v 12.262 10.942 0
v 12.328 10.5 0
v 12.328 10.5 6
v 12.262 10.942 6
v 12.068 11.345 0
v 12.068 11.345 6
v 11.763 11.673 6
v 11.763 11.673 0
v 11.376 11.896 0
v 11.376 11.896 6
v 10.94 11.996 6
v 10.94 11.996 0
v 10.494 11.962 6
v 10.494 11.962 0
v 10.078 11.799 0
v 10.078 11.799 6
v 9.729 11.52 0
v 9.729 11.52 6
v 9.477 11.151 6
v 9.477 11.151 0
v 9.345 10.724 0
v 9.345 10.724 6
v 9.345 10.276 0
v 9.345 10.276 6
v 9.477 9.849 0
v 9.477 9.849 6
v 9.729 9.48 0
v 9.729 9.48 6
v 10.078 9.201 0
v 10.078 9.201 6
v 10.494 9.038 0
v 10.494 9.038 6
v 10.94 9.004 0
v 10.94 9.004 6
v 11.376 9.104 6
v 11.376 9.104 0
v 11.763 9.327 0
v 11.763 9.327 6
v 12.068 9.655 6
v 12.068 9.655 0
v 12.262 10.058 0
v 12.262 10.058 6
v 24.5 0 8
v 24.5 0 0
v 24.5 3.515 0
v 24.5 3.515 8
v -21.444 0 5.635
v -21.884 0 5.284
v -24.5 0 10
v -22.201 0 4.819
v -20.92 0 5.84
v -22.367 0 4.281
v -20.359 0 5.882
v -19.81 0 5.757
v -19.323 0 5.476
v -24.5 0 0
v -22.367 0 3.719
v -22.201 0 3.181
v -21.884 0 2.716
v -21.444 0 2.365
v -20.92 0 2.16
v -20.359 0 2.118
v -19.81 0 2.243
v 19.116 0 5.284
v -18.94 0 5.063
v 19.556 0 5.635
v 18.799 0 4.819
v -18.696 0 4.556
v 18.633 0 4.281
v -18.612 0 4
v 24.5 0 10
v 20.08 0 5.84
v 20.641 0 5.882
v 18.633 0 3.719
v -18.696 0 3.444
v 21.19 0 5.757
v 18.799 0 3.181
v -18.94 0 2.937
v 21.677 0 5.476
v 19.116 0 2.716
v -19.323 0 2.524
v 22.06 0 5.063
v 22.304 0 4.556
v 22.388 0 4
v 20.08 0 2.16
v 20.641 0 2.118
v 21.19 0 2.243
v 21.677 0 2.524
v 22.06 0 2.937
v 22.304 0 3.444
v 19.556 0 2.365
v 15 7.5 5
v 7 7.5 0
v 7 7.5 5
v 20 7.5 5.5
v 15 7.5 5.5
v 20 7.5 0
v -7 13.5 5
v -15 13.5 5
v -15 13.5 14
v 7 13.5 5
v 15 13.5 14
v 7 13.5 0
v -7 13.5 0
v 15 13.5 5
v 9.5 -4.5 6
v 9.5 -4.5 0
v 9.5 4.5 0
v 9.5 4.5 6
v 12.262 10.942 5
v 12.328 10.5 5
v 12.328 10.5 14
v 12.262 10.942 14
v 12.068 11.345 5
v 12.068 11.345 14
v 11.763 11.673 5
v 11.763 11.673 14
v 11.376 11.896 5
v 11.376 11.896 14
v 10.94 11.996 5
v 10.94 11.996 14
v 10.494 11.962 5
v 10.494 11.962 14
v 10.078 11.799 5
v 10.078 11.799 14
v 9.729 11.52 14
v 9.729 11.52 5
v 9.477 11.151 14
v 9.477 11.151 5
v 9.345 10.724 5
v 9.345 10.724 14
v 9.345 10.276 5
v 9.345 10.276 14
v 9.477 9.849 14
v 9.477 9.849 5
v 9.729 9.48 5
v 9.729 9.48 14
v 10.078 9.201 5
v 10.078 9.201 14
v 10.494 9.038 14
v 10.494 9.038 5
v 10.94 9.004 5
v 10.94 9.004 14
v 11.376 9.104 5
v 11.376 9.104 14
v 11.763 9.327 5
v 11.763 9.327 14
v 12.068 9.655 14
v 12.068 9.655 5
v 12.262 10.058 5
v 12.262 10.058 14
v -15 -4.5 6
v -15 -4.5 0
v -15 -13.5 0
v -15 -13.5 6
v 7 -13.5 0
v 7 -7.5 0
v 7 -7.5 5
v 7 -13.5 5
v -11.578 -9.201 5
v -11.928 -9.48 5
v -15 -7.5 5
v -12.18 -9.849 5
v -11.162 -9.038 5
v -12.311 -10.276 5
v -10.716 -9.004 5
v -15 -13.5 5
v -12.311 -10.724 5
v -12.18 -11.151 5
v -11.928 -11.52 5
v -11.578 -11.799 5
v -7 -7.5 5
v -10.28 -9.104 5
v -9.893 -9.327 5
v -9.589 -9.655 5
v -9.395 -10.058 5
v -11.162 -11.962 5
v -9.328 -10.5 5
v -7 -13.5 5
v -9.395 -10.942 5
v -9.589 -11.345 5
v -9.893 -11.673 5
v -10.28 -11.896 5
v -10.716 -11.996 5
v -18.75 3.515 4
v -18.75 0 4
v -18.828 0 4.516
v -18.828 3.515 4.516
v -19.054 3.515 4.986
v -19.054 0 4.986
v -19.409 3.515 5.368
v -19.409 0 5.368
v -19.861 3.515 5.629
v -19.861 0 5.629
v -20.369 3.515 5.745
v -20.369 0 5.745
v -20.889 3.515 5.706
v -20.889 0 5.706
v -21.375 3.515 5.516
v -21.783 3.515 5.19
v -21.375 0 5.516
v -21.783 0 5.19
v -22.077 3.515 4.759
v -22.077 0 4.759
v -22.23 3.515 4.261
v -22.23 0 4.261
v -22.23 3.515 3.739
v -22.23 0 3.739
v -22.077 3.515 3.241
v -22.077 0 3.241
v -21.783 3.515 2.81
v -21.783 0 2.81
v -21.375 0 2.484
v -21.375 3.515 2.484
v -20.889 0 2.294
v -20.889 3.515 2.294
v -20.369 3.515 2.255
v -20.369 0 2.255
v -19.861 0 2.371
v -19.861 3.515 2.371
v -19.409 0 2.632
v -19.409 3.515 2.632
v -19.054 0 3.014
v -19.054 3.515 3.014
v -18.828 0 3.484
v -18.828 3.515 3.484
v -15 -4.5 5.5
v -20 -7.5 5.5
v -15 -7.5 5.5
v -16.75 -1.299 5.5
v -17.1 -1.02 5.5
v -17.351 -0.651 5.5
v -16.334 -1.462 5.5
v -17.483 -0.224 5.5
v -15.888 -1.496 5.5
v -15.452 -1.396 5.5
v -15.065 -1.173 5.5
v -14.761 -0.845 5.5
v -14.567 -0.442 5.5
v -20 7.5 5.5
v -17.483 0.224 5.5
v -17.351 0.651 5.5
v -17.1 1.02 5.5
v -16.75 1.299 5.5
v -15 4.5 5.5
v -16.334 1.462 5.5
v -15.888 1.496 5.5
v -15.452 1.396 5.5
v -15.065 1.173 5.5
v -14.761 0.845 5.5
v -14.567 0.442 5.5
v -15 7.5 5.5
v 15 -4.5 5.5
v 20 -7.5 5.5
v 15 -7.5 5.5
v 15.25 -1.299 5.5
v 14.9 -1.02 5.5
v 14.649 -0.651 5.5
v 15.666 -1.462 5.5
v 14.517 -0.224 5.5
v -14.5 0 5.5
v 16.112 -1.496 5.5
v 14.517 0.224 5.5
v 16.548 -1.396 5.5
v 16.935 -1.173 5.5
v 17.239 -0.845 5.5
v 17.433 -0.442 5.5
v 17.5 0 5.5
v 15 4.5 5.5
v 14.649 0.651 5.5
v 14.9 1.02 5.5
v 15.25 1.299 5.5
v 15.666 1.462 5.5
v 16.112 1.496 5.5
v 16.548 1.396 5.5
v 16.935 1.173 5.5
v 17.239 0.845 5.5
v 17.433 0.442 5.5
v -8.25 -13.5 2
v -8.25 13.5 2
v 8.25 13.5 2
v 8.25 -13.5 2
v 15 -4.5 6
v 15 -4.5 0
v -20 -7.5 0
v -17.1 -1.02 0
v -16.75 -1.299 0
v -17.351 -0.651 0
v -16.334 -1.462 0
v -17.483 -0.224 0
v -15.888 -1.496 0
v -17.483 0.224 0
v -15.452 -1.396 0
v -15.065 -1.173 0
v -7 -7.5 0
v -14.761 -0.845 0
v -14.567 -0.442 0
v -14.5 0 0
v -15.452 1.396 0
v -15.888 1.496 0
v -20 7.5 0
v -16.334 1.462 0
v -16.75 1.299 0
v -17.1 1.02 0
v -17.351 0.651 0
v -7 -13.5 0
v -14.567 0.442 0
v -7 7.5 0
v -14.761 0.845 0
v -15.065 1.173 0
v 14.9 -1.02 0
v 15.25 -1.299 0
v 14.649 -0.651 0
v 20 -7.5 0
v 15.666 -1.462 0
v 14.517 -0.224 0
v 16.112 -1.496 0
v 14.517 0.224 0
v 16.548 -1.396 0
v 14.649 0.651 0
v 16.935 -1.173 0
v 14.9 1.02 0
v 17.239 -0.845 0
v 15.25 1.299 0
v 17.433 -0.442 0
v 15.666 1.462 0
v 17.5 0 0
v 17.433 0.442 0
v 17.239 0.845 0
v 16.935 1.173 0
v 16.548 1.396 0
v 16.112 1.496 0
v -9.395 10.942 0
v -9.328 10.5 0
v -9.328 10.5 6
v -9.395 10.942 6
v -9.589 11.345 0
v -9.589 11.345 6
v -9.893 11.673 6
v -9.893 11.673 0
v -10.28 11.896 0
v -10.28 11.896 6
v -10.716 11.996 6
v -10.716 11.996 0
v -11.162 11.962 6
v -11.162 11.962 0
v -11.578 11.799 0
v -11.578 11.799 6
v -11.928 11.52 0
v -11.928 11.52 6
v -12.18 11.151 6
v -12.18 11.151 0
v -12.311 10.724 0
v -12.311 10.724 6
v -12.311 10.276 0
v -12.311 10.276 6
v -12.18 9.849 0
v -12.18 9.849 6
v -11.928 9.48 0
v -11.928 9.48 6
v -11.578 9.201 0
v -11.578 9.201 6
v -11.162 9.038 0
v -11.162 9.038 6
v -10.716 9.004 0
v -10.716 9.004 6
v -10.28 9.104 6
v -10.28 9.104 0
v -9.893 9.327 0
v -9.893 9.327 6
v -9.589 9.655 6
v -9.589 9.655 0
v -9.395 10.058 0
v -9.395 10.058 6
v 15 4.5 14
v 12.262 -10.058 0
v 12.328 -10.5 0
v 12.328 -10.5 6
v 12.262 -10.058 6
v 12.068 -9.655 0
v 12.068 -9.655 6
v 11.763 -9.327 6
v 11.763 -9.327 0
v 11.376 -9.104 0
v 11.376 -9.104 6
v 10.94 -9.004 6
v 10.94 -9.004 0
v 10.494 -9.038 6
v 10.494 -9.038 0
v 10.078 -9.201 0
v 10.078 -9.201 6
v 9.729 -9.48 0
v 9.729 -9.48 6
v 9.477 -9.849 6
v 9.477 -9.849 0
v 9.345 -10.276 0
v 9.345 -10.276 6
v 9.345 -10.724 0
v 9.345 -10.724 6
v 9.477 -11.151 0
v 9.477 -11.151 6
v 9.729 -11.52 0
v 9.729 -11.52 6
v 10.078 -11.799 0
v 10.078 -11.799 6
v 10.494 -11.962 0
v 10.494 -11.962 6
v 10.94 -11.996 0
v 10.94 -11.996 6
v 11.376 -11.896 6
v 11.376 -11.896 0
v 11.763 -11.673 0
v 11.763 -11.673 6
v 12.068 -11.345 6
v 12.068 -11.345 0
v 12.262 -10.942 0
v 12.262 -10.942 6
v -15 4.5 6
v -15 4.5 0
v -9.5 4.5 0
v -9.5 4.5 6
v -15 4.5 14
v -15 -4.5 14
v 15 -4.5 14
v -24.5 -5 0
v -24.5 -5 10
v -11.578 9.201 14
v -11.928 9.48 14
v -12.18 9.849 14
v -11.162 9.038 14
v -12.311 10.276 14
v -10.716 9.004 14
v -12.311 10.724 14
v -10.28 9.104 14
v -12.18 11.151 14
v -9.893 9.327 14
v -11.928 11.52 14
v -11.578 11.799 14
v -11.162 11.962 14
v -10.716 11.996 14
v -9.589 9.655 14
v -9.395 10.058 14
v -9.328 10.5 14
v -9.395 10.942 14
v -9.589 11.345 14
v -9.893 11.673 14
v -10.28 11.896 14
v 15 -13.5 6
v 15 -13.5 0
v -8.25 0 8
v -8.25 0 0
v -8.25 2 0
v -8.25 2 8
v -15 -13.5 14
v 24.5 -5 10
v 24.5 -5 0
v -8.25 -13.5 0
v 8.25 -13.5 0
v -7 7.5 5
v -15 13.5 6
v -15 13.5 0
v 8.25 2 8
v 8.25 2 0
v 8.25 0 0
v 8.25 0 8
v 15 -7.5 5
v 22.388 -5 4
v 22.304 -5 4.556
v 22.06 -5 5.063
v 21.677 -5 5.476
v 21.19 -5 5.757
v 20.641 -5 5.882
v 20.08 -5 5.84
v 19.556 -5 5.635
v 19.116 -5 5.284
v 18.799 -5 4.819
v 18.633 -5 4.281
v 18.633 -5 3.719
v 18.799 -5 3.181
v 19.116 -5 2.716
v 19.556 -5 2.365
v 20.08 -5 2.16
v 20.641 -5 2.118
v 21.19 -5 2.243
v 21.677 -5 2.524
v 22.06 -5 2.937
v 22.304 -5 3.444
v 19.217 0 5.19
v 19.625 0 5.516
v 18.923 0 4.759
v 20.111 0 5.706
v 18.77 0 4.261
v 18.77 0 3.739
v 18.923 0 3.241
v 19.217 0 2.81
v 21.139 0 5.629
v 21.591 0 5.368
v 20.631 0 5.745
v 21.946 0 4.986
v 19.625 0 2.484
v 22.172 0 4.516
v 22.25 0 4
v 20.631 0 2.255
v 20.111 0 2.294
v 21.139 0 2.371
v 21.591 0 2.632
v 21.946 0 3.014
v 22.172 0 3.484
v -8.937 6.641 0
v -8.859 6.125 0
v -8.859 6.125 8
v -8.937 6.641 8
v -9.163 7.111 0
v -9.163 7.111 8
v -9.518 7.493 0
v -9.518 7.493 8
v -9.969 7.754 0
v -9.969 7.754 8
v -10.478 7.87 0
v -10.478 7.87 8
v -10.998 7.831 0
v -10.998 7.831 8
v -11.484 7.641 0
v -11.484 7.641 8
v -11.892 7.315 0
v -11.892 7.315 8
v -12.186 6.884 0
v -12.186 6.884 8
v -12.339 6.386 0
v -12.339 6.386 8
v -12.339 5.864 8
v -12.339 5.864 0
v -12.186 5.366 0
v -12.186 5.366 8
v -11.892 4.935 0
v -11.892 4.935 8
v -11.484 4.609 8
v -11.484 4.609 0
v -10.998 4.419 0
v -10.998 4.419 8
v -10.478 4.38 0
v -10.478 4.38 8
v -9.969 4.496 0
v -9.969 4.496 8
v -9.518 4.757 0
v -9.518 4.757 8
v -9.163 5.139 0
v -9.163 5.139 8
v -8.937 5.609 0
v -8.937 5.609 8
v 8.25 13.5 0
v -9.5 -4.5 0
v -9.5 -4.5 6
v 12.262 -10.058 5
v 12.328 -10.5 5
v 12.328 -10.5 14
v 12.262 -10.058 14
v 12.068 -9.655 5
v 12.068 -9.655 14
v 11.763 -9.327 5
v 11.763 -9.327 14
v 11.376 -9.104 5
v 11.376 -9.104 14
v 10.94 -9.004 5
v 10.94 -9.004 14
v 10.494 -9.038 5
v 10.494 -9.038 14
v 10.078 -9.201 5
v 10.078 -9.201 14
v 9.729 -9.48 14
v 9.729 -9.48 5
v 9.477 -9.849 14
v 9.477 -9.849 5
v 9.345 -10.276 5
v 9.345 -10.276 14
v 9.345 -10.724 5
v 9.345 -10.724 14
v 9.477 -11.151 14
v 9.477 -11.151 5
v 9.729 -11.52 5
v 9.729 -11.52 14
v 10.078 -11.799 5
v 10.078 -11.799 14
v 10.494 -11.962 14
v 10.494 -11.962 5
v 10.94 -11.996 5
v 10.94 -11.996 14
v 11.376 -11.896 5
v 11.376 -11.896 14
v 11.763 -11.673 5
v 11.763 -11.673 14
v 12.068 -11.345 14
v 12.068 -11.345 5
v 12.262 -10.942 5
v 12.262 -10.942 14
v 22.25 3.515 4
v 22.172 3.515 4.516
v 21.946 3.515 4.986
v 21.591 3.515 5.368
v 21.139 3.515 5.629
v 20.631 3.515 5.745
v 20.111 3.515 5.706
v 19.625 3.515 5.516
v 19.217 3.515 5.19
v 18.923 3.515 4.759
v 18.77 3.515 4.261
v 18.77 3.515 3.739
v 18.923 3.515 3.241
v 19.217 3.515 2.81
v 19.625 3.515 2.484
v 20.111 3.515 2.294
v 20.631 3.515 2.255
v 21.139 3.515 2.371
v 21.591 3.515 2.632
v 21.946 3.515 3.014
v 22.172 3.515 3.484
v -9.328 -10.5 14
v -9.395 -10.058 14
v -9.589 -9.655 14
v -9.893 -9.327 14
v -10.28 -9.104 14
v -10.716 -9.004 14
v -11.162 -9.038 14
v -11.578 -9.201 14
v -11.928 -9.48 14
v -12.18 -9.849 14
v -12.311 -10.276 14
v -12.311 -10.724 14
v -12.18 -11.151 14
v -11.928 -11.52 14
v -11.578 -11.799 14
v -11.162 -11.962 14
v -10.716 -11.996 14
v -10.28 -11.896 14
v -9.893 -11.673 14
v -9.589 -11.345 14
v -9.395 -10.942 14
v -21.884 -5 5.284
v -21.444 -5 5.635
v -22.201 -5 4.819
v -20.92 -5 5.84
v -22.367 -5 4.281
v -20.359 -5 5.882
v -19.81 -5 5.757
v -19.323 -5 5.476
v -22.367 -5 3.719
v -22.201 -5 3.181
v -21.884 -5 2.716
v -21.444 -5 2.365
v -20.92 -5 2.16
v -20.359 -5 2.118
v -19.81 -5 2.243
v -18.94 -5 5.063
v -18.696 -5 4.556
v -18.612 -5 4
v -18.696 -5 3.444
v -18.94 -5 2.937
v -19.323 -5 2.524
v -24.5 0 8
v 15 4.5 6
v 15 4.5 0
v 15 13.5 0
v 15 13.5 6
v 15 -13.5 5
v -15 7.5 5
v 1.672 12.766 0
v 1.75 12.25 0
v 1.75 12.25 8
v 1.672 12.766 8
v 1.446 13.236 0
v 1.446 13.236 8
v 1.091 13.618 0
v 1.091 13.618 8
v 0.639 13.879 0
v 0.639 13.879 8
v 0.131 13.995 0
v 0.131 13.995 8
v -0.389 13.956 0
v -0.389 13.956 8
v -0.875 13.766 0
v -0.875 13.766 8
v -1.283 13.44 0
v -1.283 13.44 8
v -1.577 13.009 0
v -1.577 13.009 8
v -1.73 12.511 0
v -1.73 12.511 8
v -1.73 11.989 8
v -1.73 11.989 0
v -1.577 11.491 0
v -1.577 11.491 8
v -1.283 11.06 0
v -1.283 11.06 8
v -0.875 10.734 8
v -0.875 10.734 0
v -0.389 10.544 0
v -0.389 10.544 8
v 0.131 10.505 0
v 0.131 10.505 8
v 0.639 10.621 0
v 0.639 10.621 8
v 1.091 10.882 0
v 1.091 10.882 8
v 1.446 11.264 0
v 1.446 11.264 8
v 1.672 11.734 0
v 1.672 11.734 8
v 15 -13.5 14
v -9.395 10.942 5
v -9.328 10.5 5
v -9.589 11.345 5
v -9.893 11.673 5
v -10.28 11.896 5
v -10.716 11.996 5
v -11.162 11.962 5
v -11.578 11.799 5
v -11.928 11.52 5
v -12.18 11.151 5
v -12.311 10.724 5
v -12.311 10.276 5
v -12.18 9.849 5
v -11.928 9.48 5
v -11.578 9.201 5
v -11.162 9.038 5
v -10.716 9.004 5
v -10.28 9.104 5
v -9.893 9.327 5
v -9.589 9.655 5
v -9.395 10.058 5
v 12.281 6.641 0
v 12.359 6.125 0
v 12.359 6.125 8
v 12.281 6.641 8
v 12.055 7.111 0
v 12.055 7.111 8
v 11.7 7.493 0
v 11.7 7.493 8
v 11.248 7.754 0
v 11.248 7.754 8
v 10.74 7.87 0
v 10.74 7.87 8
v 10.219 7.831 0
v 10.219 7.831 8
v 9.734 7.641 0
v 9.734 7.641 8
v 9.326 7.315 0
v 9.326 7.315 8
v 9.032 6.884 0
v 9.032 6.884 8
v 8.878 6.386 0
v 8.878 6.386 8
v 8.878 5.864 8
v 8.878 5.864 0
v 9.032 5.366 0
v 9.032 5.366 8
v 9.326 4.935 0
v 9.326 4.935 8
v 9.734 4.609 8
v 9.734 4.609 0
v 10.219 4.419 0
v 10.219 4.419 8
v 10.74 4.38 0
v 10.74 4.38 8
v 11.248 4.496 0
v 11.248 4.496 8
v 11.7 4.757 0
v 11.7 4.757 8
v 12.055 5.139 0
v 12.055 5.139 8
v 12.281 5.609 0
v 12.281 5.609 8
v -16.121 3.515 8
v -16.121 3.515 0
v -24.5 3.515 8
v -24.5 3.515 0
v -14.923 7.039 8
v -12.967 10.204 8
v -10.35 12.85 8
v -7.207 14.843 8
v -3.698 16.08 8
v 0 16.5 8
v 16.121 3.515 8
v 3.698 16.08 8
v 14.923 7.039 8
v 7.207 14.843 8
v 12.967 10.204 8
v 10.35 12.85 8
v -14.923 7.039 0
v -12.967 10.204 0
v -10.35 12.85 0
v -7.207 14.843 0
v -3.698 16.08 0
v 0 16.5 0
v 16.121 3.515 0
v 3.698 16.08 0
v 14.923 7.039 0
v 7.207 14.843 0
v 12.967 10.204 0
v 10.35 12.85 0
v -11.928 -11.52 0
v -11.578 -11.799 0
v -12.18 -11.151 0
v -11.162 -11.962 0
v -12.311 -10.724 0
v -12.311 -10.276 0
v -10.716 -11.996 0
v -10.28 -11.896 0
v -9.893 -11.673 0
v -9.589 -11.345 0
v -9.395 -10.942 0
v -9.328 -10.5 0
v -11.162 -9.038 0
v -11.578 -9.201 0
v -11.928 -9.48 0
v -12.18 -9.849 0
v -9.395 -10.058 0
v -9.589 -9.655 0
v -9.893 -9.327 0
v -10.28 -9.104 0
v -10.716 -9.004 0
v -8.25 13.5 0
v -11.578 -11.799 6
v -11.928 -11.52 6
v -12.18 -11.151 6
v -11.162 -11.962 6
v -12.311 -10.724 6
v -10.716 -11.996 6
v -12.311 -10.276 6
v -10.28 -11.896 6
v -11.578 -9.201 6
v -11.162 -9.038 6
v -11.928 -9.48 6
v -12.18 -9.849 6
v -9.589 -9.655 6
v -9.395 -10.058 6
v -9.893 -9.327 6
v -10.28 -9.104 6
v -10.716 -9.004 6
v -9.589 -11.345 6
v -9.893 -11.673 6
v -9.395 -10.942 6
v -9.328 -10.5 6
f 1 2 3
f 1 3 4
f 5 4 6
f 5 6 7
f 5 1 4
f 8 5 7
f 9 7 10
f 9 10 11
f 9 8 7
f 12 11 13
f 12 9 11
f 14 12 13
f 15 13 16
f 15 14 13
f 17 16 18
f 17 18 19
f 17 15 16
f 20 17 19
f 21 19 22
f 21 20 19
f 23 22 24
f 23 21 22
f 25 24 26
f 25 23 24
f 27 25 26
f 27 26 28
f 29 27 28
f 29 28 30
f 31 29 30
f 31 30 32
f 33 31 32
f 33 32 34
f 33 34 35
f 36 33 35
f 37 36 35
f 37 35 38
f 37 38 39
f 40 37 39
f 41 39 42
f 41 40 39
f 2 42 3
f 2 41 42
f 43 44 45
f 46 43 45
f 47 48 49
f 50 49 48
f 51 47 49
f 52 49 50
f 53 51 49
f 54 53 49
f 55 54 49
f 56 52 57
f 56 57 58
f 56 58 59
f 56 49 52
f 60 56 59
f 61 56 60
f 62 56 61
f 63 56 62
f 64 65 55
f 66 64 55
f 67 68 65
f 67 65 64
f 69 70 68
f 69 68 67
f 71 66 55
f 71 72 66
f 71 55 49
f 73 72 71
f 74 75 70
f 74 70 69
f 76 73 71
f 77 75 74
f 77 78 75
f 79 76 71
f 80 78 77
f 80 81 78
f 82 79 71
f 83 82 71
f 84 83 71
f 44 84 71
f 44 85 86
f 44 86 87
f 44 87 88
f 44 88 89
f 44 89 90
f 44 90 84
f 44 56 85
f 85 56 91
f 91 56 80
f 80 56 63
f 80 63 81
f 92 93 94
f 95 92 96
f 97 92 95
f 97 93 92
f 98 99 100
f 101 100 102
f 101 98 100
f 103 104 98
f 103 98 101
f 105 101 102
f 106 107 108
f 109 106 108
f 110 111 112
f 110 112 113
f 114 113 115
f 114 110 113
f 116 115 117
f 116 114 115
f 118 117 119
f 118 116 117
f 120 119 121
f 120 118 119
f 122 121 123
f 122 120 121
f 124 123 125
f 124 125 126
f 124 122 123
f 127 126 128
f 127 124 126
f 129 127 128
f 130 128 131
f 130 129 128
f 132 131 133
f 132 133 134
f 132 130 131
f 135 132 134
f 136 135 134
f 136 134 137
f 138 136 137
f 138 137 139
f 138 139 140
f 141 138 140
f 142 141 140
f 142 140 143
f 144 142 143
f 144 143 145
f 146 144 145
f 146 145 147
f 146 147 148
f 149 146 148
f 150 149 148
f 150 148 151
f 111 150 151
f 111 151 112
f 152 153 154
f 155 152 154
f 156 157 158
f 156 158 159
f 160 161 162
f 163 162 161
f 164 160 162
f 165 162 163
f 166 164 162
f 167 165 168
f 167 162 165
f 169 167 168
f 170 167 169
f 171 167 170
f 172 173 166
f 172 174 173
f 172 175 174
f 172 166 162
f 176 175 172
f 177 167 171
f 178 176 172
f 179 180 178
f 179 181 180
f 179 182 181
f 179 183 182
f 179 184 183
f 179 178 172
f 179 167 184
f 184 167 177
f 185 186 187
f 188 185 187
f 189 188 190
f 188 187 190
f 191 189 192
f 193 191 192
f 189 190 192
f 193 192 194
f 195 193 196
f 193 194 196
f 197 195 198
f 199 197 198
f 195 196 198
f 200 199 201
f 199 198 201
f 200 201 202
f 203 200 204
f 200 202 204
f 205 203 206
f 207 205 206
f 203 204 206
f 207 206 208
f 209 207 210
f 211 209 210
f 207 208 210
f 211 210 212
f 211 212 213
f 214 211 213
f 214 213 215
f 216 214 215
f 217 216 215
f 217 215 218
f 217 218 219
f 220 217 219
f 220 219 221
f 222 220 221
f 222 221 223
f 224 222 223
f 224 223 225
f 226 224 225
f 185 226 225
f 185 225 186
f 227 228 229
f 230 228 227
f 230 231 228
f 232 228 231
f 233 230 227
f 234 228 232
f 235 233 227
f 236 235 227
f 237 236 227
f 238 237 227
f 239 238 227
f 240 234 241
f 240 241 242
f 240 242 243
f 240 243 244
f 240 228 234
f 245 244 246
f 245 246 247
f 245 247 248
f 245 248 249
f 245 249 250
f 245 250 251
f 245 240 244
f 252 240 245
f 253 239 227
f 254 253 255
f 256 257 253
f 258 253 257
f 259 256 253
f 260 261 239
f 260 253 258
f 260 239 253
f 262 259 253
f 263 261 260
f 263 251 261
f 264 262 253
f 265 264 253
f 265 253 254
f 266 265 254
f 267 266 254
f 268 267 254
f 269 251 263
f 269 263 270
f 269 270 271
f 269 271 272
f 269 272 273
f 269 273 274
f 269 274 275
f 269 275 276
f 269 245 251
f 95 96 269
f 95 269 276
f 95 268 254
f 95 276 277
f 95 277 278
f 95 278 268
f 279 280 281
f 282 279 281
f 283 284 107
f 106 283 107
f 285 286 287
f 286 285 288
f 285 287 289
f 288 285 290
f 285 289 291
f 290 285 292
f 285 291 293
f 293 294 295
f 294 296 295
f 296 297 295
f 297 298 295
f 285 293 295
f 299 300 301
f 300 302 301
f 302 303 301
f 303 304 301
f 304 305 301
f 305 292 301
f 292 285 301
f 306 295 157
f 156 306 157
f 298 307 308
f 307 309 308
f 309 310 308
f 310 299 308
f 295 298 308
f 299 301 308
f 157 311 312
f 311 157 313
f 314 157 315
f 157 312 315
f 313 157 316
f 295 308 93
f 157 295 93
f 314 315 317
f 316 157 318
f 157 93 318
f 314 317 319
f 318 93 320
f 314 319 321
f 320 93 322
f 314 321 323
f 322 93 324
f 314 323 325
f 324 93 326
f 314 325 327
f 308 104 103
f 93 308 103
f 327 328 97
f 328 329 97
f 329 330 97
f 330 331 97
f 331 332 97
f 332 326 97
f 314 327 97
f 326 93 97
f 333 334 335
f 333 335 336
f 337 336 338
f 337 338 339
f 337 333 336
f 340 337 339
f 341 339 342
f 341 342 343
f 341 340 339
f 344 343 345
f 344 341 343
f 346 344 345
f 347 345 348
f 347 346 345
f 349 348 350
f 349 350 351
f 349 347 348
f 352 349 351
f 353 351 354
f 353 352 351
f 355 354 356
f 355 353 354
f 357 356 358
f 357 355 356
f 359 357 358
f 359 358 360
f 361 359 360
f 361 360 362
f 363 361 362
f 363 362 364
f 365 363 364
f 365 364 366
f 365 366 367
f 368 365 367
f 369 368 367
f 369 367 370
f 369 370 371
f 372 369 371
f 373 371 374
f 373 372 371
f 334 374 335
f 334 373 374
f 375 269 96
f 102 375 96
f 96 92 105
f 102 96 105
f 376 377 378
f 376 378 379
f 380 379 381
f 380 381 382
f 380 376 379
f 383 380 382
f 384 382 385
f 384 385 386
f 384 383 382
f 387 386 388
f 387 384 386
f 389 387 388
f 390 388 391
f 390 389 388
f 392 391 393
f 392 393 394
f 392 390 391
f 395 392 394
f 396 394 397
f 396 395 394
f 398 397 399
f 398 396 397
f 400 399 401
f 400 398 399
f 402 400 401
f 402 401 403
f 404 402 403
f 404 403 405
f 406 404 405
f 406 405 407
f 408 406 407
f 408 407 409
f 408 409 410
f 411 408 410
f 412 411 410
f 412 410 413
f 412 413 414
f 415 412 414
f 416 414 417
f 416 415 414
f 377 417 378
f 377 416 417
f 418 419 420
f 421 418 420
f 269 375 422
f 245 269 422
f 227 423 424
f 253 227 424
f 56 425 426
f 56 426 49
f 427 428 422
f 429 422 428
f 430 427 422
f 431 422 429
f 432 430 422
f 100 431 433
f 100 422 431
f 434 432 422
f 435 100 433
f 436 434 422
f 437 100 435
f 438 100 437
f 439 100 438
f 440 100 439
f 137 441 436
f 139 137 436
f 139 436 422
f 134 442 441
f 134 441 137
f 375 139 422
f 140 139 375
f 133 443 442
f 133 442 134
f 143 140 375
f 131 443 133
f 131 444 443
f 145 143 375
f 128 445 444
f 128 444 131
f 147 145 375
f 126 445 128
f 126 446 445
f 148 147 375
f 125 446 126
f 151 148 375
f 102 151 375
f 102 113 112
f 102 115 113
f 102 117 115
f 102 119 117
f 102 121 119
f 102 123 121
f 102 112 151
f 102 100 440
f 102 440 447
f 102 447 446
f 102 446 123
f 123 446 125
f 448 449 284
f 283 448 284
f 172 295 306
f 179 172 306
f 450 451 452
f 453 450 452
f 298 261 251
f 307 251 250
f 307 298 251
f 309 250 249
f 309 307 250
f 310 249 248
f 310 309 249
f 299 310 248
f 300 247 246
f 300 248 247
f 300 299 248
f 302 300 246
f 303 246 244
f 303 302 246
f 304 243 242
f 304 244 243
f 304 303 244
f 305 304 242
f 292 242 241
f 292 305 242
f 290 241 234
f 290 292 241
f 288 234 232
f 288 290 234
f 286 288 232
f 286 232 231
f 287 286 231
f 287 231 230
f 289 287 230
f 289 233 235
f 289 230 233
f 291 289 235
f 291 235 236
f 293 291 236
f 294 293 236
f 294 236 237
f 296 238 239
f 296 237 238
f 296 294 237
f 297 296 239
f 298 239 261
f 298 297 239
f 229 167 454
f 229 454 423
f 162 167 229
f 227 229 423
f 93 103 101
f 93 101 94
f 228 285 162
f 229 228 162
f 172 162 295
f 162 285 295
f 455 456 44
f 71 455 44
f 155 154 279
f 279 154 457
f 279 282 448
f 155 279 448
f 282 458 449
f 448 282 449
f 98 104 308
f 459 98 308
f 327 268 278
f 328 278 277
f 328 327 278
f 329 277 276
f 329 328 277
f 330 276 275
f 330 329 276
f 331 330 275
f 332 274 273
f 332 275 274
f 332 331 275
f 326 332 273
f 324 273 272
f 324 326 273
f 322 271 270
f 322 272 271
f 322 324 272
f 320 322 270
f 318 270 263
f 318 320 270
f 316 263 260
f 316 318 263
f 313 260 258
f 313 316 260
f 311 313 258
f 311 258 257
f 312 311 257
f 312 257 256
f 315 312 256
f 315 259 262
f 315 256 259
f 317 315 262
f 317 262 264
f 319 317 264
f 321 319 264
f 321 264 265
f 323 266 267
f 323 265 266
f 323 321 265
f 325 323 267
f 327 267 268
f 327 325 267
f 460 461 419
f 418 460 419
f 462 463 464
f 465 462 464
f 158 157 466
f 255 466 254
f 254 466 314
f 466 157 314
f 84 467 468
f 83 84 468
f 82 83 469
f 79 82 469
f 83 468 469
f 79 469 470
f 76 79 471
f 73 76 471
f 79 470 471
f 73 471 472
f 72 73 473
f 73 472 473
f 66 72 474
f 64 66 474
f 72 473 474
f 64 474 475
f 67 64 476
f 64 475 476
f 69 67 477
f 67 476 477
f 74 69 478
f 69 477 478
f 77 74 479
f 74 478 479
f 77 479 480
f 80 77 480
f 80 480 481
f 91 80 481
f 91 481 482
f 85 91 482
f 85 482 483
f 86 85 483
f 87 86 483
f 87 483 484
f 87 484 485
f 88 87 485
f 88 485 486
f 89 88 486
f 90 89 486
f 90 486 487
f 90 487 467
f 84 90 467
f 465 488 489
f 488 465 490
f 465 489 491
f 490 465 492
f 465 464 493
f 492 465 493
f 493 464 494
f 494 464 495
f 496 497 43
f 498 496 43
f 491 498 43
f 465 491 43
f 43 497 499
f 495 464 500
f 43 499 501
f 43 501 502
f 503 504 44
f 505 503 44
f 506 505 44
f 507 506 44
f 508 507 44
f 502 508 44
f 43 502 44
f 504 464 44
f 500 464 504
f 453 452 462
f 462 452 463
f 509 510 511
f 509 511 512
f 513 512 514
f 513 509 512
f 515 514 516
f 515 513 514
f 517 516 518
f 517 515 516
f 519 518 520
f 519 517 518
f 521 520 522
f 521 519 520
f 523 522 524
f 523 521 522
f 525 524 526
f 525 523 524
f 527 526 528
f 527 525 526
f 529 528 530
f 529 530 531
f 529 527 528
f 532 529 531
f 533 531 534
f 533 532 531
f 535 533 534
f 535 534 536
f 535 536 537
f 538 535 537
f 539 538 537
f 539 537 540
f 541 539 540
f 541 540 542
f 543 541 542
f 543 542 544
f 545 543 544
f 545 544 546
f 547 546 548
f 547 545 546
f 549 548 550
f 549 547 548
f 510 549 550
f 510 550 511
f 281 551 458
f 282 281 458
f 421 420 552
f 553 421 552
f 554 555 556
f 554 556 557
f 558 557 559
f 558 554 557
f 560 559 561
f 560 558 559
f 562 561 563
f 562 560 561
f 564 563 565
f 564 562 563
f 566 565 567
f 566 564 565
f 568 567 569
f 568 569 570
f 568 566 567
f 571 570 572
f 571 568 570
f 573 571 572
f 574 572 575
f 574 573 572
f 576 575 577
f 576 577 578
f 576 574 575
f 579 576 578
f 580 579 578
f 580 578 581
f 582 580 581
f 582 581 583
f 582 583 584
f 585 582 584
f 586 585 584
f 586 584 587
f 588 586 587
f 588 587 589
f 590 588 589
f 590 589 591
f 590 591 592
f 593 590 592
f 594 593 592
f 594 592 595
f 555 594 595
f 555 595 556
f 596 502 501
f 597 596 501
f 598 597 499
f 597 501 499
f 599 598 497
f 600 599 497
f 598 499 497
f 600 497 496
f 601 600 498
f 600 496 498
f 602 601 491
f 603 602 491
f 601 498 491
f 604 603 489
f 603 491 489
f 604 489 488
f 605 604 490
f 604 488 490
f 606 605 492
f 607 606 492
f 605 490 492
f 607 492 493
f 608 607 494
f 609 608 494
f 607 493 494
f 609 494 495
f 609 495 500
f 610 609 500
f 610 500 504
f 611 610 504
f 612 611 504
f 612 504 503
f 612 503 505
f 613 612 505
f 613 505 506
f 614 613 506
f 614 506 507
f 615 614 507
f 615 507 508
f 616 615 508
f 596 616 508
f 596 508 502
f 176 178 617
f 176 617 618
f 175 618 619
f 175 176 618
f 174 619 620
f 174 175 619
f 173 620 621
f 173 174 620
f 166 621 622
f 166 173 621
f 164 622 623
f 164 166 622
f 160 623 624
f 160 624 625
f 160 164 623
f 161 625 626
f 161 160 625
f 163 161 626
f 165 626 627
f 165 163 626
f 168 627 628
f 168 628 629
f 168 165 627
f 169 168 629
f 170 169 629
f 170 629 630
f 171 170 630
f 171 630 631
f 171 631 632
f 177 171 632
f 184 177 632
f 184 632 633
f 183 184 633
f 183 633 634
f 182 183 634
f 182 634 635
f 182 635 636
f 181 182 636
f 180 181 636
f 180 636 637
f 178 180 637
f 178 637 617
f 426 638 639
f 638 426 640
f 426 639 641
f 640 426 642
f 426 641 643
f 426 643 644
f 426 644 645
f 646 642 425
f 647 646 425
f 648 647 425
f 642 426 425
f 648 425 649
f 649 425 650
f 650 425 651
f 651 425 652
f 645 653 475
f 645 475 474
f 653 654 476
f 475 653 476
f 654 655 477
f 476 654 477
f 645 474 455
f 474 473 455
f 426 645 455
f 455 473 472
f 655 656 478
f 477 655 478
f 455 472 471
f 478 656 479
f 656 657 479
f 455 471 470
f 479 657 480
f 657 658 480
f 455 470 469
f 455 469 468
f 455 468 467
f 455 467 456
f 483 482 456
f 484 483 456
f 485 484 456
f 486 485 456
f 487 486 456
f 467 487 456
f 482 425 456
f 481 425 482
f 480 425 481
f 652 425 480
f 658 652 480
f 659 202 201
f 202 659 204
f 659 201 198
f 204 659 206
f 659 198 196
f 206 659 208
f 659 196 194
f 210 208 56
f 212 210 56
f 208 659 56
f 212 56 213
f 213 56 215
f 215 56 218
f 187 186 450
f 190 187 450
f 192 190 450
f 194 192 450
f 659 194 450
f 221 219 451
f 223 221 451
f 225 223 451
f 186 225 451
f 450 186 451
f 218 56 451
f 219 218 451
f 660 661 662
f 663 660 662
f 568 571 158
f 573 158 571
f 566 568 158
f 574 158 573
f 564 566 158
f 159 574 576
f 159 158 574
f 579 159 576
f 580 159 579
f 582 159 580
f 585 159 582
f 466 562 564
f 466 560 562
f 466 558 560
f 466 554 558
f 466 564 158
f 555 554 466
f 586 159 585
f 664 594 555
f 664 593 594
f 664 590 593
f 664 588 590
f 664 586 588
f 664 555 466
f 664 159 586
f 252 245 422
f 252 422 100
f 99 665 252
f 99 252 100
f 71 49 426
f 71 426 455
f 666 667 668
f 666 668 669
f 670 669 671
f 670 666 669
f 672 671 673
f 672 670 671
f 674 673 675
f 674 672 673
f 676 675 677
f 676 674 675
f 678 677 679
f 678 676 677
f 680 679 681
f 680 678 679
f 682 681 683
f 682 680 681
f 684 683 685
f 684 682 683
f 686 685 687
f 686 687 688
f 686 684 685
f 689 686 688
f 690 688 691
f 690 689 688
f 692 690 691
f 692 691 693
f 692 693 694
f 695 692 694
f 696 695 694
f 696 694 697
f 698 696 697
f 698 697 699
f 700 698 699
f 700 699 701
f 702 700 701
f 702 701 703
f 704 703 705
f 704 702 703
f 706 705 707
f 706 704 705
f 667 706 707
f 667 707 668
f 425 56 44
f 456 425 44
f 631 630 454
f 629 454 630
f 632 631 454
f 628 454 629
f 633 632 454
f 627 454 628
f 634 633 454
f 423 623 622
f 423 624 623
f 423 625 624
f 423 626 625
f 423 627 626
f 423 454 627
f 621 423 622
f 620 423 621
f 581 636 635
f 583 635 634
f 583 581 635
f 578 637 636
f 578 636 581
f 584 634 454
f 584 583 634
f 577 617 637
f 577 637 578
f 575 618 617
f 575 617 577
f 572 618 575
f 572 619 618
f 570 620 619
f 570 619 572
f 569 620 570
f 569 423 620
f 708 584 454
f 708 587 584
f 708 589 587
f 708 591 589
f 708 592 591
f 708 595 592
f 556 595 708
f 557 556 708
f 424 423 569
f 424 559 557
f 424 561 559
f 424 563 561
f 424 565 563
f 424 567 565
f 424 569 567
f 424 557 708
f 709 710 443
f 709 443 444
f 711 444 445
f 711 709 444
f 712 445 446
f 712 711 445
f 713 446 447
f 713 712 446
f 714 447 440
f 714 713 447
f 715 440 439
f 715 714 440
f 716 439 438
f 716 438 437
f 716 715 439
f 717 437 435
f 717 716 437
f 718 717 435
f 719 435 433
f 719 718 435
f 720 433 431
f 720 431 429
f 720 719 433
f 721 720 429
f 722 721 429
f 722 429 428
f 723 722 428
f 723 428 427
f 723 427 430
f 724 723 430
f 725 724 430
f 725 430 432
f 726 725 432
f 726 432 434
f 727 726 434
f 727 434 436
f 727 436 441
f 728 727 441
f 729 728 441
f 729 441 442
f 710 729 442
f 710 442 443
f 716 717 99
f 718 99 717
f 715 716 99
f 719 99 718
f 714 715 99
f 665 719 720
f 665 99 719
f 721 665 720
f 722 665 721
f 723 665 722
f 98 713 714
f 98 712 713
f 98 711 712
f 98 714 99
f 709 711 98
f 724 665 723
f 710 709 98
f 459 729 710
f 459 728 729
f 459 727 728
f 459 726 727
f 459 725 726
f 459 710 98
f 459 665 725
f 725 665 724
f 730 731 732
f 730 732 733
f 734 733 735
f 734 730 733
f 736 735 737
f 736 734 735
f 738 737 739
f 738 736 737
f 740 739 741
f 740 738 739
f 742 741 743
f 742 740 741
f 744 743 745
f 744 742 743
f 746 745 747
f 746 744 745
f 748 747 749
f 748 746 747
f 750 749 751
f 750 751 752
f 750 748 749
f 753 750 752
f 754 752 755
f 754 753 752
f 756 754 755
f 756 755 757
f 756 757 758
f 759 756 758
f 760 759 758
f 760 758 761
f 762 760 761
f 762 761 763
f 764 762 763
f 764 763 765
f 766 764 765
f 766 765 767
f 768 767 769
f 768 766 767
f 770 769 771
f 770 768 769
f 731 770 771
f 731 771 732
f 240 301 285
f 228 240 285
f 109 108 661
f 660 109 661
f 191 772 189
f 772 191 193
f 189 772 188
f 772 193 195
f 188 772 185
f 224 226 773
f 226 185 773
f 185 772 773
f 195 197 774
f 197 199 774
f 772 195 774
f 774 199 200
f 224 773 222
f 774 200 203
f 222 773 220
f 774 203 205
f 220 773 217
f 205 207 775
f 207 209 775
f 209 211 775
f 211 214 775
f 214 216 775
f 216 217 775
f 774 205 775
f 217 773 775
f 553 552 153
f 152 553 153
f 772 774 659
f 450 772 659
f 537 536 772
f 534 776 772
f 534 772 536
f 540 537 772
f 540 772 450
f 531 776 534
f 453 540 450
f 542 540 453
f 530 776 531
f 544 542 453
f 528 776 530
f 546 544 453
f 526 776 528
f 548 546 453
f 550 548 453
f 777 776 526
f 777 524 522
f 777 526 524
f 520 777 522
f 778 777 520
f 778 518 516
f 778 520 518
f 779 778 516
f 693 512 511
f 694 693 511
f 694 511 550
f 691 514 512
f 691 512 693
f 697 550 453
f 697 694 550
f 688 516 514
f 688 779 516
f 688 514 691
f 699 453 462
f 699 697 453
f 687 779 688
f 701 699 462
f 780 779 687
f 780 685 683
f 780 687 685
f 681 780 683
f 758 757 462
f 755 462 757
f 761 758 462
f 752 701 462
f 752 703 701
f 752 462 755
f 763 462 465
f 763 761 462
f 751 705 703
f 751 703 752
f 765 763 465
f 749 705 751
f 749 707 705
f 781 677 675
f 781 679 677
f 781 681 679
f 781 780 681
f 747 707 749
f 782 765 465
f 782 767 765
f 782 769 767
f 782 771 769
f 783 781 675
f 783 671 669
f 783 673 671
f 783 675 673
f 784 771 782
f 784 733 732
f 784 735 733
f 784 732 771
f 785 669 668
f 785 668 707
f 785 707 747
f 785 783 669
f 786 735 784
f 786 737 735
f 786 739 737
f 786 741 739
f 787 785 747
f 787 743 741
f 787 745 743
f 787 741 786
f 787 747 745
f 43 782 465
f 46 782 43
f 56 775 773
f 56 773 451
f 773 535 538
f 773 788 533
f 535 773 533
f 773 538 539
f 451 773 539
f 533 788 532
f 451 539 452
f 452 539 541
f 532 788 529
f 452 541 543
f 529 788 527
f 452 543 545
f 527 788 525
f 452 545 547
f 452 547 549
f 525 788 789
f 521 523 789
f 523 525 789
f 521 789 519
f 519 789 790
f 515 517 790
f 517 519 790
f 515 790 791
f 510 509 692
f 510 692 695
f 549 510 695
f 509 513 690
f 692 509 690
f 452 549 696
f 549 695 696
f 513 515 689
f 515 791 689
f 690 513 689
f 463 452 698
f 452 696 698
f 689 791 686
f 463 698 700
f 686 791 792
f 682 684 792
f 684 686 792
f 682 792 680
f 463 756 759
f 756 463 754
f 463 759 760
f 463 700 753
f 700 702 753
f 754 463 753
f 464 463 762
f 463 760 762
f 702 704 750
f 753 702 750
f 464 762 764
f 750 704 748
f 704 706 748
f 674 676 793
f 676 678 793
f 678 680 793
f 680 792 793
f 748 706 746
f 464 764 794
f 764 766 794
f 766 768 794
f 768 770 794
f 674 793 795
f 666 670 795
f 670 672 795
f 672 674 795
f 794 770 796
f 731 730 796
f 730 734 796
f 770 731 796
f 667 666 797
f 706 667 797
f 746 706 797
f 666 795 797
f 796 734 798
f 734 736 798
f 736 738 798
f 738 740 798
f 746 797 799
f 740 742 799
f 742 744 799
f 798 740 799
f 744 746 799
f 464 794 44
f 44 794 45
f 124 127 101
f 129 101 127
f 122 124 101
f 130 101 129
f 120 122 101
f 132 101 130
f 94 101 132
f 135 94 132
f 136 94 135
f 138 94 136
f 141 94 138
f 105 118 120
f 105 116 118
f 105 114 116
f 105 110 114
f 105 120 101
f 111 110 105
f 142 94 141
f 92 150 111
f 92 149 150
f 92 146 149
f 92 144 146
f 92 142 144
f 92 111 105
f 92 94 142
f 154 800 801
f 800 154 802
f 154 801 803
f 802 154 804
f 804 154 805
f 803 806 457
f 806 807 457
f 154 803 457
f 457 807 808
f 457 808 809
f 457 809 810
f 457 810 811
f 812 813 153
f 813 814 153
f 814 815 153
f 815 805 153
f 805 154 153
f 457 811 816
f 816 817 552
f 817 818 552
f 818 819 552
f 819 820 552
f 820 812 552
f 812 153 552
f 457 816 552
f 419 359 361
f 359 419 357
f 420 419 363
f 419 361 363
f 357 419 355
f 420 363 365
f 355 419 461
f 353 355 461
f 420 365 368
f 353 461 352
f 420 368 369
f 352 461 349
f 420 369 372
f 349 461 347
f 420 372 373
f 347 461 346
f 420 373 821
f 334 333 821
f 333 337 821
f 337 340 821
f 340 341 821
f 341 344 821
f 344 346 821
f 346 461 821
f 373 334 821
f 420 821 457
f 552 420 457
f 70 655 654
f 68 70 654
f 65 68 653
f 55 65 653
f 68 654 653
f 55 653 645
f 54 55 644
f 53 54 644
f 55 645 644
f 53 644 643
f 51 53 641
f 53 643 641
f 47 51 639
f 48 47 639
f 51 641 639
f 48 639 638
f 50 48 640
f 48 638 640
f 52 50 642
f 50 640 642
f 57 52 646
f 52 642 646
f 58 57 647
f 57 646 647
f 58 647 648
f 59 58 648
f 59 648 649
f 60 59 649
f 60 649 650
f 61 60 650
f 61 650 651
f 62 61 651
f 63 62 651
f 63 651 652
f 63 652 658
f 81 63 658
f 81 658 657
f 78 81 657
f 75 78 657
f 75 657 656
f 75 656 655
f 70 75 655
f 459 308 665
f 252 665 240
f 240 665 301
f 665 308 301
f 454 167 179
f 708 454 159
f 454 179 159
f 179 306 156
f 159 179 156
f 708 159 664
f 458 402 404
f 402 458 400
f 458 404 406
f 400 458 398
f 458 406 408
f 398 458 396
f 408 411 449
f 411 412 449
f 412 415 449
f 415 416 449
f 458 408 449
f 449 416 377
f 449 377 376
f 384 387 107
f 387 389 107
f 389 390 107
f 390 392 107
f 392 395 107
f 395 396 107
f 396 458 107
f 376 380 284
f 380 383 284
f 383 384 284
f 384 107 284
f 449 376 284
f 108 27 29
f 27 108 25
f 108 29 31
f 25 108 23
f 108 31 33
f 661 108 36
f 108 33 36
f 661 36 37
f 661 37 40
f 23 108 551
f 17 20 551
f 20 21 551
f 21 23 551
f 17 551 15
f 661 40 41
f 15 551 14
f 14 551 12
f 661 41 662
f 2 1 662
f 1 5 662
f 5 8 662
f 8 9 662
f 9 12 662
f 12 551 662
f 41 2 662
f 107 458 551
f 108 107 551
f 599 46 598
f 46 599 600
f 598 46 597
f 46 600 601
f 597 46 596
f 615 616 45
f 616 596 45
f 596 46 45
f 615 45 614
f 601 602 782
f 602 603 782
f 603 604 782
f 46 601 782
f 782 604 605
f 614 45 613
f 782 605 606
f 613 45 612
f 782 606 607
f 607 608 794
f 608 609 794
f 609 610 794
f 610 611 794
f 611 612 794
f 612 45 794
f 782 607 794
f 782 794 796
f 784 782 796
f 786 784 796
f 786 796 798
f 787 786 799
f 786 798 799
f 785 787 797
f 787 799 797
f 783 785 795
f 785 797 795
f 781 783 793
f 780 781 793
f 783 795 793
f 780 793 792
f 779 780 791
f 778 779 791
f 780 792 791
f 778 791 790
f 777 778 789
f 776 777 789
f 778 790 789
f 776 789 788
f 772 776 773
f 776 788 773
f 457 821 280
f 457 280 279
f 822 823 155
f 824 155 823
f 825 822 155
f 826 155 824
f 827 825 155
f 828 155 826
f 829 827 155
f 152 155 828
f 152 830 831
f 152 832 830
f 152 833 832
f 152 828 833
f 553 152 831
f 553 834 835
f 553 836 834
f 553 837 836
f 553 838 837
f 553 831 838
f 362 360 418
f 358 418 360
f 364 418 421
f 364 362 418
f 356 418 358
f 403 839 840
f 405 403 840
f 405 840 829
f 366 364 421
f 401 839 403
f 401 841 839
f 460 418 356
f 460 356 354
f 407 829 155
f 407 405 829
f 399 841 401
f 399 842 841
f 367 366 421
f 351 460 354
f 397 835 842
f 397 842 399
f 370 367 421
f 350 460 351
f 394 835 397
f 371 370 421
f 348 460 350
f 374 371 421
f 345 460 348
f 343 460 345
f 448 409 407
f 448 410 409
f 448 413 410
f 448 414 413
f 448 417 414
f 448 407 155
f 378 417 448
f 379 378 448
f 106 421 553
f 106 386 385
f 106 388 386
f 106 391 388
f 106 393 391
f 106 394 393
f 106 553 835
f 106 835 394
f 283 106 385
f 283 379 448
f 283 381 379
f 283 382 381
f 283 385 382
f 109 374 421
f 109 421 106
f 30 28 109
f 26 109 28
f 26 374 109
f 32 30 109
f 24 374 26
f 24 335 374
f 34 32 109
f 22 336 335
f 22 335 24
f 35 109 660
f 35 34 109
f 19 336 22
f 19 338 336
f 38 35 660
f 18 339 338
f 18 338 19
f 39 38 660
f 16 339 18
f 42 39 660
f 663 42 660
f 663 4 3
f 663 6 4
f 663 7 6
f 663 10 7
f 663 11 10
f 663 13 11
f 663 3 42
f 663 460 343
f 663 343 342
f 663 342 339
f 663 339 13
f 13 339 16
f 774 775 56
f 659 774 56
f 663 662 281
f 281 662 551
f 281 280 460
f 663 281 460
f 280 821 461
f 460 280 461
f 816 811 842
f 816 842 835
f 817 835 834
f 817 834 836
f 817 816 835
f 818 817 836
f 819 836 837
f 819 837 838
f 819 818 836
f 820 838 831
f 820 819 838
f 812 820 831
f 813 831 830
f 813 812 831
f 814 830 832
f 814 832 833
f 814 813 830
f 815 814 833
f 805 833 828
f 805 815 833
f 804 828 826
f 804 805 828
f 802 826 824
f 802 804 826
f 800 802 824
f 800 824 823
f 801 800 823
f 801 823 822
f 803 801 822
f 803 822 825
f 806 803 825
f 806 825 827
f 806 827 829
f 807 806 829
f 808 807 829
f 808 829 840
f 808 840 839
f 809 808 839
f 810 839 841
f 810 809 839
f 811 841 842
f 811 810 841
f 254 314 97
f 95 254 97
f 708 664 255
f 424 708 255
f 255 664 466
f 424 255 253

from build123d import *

# Parameters (mm, degrees)
F0_R      = 1.5
F0_W      = 30
F0_H      = 6
F1_DEPTH  = 14
F3_DEPTH  = 8.5
F4_R      = 1.5
F5_DEPTH  = 6
F6_W      = 16.5
F6_H      = 27
F7_DEPTH  = 2
F8_W      = 8
F8_H      = 6
F9_DEPTH  = 5
F10_R     = 1.75
F11_DEPTH = 8
F12_R     = 1.75
F13_DEPTH = 25
F14_W     = 49
F14_H     = 5
F15_DEPTH = 10
F16_R     = 1.8877590654
F17_DEPTH = 8


with BuildPart() as f1:
    # F0 (on Top) → F1 (new body)
    with BuildSketch(Plane.XY):
        Polygon((-15, 7.5), (-20, 7.5), (-20, -7.5), (-15, -7.5), (15, -7.5), (20, -7.5), (20, 7.5), (15, 7.5), align=None)
        with Locations((-16, 0)):
            Circle(F0_R, mode=Mode.SUBTRACT)
        with Locations((16, 0)):
            Circle(F0_R, mode=Mode.SUBTRACT)
        with Locations((0, 10.5)):
            Rectangle(F0_W, F0_H)
        with Locations((-10.828246883, 10.5)):
            Circle(F0_R, mode=Mode.SUBTRACT)
        with Locations((10.828246883, 10.5)):
            Circle(F0_R, mode=Mode.SUBTRACT)
        with Locations((0, -10.5)):
            Rectangle(F0_W, F0_H)
        with Locations((-10.828246883, -10.5)):
            Circle(F0_R, mode=Mode.SUBTRACT)
        with Locations((10.828246883, -10.5)):
            Circle(F0_R, mode=Mode.SUBTRACT)
    extrude(amount=F1_DEPTH)

    # F2 (on face) → F3 (cut)
    with BuildSketch(Plane.XY.offset(14)):
        Polygon((15, 4.5), (-15, 4.5), (-15, 7.5), (-20, 7.5), (-20, 4.5), (-20, -4.5), (-20, -7.5), (-15, -7.5), (-15, -4.5), (15, -4.5), (15, -7.5), (20, -7.5), (20, -4.5), (20, 4.5), (20, 7.5), (15, 7.5), align=None)
    extrude(amount=-F3_DEPTH, mode=Mode.SUBTRACT)

    # F8 (on face) → F9 (cut)
    with BuildSketch(Plane(origin=(0, 0, 0), x_dir=(1, 0, 0), z_dir=(0, 0, -1))):
        with Locations((-11, 10.5)):
            Rectangle(F8_W, F8_H)
        with Locations((11, 10.5)):
            Rectangle(F8_W, F8_H)
        with Locations((-11, -10.5)):
            Rectangle(F8_W, F8_H)
        with Locations((11, -10.5)):
            Rectangle(F8_W, F8_H)
    extrude(amount=-F9_DEPTH, mode=Mode.SUBTRACT)


with BuildPart() as f5:
    # F4 (on Top) → F5 (new body)
    with BuildSketch(Plane.XY):
        Polygon((15, 13.5), (-15, 13.5), (-15, 4.5), (-9.5, 4.5), (-9.5, -4.5), (-15, -4.5), (-15, -13.5), (15, -13.5), (15, -4.5), (9.5, -4.5), (9.5, 4.5), (15, 4.5), align=None)
        with Locations((-10.828246883, -10.5)):
            Circle(F4_R, mode=Mode.SUBTRACT)
        with Locations((10.828246883, -10.5)):
            Circle(F4_R, mode=Mode.SUBTRACT)
        with Locations((-10.828246883, 10.5)):
            Circle(F4_R, mode=Mode.SUBTRACT)
        with Locations((10.828246883, 10.5)):
            Circle(F4_R, mode=Mode.SUBTRACT)
    extrude(amount=F5_DEPTH)

    # F6 (on face) → F7 (cut)
    with BuildSketch(Plane(origin=(0, 0, 0), x_dir=(1, 0, 0), z_dir=(0, 0, -1))):
        Rectangle(F6_W, F6_H)
    extrude(amount=-F7_DEPTH, mode=Mode.SUBTRACT)


with BuildPart() as f11:
    # F10 (on Top) → F11 (new body)
    with BuildSketch(Plane.XY):
        with BuildLine():
            Line((-24.5, 0), (-16.5, 0))
            Line((-16.5, 0), (-8.25, 0))
            Line((-8.25, 0), (-8.25, 2))
            Line((-8.25, 2), (8.25, 2))
            Line((8.25, 2), (8.25, 0))
            Line((8.25, 0), (16.5, 0))
            Line((16.5, 0), (24.5, 0))
            Line((24.5, 0), (24.5, 3.5153171048))
            Line((24.5, 3.5153171048), (16.1211831344, 3.5153171048))
            ThreePointArc((16.1211831344, 3.5153171048), (0, 16.5), (-16.1211831344, 3.5153171048))
            Line((-16.1211831344, 3.5153171048), (-24.5, 3.5153171048))
            Line((-24.5, 3.5153171048), (-24.5, 0))
        make_face()
        with Locations((-10.6088111964, 6.125)):
            Circle(F10_R, mode=Mode.SUBTRACT)
        with Locations((10.6088111964, 6.125)):
            Circle(F10_R, mode=Mode.SUBTRACT)
        with Locations((0, 12.25)):
            Circle(F10_R, mode=Mode.SUBTRACT)
    extrude(amount=F11_DEPTH)

    # F12 (on face) → F13 (cut)
    with BuildSketch(Plane.XZ):
        with Locations((-20.5, 4)):
            Circle(F12_R)
        with Locations((20.5, 4)):
            Circle(F12_R)
    extrude(amount=-F13_DEPTH, mode=Mode.SUBTRACT)


with BuildPart() as f15:
    # F14 (on Top) → F15 (new body)
    with BuildSketch(Plane.XY):
        with Locations((0, -2.5)):
            Rectangle(F14_W, F14_H)
    extrude(amount=F15_DEPTH)

    # F16 (on face) → F17 (cut)
    with BuildSketch(Plane.XZ.offset(5)):
        with Locations((-20.5, 4)):
            Circle(F16_R)
        with Locations((20.5, 4)):
            Circle(F16_R)
    extrude(amount=-F17_DEPTH, mode=Mode.SUBTRACT)


solid = Compound([f1.part, f5.part, f11.part, f15.part])
